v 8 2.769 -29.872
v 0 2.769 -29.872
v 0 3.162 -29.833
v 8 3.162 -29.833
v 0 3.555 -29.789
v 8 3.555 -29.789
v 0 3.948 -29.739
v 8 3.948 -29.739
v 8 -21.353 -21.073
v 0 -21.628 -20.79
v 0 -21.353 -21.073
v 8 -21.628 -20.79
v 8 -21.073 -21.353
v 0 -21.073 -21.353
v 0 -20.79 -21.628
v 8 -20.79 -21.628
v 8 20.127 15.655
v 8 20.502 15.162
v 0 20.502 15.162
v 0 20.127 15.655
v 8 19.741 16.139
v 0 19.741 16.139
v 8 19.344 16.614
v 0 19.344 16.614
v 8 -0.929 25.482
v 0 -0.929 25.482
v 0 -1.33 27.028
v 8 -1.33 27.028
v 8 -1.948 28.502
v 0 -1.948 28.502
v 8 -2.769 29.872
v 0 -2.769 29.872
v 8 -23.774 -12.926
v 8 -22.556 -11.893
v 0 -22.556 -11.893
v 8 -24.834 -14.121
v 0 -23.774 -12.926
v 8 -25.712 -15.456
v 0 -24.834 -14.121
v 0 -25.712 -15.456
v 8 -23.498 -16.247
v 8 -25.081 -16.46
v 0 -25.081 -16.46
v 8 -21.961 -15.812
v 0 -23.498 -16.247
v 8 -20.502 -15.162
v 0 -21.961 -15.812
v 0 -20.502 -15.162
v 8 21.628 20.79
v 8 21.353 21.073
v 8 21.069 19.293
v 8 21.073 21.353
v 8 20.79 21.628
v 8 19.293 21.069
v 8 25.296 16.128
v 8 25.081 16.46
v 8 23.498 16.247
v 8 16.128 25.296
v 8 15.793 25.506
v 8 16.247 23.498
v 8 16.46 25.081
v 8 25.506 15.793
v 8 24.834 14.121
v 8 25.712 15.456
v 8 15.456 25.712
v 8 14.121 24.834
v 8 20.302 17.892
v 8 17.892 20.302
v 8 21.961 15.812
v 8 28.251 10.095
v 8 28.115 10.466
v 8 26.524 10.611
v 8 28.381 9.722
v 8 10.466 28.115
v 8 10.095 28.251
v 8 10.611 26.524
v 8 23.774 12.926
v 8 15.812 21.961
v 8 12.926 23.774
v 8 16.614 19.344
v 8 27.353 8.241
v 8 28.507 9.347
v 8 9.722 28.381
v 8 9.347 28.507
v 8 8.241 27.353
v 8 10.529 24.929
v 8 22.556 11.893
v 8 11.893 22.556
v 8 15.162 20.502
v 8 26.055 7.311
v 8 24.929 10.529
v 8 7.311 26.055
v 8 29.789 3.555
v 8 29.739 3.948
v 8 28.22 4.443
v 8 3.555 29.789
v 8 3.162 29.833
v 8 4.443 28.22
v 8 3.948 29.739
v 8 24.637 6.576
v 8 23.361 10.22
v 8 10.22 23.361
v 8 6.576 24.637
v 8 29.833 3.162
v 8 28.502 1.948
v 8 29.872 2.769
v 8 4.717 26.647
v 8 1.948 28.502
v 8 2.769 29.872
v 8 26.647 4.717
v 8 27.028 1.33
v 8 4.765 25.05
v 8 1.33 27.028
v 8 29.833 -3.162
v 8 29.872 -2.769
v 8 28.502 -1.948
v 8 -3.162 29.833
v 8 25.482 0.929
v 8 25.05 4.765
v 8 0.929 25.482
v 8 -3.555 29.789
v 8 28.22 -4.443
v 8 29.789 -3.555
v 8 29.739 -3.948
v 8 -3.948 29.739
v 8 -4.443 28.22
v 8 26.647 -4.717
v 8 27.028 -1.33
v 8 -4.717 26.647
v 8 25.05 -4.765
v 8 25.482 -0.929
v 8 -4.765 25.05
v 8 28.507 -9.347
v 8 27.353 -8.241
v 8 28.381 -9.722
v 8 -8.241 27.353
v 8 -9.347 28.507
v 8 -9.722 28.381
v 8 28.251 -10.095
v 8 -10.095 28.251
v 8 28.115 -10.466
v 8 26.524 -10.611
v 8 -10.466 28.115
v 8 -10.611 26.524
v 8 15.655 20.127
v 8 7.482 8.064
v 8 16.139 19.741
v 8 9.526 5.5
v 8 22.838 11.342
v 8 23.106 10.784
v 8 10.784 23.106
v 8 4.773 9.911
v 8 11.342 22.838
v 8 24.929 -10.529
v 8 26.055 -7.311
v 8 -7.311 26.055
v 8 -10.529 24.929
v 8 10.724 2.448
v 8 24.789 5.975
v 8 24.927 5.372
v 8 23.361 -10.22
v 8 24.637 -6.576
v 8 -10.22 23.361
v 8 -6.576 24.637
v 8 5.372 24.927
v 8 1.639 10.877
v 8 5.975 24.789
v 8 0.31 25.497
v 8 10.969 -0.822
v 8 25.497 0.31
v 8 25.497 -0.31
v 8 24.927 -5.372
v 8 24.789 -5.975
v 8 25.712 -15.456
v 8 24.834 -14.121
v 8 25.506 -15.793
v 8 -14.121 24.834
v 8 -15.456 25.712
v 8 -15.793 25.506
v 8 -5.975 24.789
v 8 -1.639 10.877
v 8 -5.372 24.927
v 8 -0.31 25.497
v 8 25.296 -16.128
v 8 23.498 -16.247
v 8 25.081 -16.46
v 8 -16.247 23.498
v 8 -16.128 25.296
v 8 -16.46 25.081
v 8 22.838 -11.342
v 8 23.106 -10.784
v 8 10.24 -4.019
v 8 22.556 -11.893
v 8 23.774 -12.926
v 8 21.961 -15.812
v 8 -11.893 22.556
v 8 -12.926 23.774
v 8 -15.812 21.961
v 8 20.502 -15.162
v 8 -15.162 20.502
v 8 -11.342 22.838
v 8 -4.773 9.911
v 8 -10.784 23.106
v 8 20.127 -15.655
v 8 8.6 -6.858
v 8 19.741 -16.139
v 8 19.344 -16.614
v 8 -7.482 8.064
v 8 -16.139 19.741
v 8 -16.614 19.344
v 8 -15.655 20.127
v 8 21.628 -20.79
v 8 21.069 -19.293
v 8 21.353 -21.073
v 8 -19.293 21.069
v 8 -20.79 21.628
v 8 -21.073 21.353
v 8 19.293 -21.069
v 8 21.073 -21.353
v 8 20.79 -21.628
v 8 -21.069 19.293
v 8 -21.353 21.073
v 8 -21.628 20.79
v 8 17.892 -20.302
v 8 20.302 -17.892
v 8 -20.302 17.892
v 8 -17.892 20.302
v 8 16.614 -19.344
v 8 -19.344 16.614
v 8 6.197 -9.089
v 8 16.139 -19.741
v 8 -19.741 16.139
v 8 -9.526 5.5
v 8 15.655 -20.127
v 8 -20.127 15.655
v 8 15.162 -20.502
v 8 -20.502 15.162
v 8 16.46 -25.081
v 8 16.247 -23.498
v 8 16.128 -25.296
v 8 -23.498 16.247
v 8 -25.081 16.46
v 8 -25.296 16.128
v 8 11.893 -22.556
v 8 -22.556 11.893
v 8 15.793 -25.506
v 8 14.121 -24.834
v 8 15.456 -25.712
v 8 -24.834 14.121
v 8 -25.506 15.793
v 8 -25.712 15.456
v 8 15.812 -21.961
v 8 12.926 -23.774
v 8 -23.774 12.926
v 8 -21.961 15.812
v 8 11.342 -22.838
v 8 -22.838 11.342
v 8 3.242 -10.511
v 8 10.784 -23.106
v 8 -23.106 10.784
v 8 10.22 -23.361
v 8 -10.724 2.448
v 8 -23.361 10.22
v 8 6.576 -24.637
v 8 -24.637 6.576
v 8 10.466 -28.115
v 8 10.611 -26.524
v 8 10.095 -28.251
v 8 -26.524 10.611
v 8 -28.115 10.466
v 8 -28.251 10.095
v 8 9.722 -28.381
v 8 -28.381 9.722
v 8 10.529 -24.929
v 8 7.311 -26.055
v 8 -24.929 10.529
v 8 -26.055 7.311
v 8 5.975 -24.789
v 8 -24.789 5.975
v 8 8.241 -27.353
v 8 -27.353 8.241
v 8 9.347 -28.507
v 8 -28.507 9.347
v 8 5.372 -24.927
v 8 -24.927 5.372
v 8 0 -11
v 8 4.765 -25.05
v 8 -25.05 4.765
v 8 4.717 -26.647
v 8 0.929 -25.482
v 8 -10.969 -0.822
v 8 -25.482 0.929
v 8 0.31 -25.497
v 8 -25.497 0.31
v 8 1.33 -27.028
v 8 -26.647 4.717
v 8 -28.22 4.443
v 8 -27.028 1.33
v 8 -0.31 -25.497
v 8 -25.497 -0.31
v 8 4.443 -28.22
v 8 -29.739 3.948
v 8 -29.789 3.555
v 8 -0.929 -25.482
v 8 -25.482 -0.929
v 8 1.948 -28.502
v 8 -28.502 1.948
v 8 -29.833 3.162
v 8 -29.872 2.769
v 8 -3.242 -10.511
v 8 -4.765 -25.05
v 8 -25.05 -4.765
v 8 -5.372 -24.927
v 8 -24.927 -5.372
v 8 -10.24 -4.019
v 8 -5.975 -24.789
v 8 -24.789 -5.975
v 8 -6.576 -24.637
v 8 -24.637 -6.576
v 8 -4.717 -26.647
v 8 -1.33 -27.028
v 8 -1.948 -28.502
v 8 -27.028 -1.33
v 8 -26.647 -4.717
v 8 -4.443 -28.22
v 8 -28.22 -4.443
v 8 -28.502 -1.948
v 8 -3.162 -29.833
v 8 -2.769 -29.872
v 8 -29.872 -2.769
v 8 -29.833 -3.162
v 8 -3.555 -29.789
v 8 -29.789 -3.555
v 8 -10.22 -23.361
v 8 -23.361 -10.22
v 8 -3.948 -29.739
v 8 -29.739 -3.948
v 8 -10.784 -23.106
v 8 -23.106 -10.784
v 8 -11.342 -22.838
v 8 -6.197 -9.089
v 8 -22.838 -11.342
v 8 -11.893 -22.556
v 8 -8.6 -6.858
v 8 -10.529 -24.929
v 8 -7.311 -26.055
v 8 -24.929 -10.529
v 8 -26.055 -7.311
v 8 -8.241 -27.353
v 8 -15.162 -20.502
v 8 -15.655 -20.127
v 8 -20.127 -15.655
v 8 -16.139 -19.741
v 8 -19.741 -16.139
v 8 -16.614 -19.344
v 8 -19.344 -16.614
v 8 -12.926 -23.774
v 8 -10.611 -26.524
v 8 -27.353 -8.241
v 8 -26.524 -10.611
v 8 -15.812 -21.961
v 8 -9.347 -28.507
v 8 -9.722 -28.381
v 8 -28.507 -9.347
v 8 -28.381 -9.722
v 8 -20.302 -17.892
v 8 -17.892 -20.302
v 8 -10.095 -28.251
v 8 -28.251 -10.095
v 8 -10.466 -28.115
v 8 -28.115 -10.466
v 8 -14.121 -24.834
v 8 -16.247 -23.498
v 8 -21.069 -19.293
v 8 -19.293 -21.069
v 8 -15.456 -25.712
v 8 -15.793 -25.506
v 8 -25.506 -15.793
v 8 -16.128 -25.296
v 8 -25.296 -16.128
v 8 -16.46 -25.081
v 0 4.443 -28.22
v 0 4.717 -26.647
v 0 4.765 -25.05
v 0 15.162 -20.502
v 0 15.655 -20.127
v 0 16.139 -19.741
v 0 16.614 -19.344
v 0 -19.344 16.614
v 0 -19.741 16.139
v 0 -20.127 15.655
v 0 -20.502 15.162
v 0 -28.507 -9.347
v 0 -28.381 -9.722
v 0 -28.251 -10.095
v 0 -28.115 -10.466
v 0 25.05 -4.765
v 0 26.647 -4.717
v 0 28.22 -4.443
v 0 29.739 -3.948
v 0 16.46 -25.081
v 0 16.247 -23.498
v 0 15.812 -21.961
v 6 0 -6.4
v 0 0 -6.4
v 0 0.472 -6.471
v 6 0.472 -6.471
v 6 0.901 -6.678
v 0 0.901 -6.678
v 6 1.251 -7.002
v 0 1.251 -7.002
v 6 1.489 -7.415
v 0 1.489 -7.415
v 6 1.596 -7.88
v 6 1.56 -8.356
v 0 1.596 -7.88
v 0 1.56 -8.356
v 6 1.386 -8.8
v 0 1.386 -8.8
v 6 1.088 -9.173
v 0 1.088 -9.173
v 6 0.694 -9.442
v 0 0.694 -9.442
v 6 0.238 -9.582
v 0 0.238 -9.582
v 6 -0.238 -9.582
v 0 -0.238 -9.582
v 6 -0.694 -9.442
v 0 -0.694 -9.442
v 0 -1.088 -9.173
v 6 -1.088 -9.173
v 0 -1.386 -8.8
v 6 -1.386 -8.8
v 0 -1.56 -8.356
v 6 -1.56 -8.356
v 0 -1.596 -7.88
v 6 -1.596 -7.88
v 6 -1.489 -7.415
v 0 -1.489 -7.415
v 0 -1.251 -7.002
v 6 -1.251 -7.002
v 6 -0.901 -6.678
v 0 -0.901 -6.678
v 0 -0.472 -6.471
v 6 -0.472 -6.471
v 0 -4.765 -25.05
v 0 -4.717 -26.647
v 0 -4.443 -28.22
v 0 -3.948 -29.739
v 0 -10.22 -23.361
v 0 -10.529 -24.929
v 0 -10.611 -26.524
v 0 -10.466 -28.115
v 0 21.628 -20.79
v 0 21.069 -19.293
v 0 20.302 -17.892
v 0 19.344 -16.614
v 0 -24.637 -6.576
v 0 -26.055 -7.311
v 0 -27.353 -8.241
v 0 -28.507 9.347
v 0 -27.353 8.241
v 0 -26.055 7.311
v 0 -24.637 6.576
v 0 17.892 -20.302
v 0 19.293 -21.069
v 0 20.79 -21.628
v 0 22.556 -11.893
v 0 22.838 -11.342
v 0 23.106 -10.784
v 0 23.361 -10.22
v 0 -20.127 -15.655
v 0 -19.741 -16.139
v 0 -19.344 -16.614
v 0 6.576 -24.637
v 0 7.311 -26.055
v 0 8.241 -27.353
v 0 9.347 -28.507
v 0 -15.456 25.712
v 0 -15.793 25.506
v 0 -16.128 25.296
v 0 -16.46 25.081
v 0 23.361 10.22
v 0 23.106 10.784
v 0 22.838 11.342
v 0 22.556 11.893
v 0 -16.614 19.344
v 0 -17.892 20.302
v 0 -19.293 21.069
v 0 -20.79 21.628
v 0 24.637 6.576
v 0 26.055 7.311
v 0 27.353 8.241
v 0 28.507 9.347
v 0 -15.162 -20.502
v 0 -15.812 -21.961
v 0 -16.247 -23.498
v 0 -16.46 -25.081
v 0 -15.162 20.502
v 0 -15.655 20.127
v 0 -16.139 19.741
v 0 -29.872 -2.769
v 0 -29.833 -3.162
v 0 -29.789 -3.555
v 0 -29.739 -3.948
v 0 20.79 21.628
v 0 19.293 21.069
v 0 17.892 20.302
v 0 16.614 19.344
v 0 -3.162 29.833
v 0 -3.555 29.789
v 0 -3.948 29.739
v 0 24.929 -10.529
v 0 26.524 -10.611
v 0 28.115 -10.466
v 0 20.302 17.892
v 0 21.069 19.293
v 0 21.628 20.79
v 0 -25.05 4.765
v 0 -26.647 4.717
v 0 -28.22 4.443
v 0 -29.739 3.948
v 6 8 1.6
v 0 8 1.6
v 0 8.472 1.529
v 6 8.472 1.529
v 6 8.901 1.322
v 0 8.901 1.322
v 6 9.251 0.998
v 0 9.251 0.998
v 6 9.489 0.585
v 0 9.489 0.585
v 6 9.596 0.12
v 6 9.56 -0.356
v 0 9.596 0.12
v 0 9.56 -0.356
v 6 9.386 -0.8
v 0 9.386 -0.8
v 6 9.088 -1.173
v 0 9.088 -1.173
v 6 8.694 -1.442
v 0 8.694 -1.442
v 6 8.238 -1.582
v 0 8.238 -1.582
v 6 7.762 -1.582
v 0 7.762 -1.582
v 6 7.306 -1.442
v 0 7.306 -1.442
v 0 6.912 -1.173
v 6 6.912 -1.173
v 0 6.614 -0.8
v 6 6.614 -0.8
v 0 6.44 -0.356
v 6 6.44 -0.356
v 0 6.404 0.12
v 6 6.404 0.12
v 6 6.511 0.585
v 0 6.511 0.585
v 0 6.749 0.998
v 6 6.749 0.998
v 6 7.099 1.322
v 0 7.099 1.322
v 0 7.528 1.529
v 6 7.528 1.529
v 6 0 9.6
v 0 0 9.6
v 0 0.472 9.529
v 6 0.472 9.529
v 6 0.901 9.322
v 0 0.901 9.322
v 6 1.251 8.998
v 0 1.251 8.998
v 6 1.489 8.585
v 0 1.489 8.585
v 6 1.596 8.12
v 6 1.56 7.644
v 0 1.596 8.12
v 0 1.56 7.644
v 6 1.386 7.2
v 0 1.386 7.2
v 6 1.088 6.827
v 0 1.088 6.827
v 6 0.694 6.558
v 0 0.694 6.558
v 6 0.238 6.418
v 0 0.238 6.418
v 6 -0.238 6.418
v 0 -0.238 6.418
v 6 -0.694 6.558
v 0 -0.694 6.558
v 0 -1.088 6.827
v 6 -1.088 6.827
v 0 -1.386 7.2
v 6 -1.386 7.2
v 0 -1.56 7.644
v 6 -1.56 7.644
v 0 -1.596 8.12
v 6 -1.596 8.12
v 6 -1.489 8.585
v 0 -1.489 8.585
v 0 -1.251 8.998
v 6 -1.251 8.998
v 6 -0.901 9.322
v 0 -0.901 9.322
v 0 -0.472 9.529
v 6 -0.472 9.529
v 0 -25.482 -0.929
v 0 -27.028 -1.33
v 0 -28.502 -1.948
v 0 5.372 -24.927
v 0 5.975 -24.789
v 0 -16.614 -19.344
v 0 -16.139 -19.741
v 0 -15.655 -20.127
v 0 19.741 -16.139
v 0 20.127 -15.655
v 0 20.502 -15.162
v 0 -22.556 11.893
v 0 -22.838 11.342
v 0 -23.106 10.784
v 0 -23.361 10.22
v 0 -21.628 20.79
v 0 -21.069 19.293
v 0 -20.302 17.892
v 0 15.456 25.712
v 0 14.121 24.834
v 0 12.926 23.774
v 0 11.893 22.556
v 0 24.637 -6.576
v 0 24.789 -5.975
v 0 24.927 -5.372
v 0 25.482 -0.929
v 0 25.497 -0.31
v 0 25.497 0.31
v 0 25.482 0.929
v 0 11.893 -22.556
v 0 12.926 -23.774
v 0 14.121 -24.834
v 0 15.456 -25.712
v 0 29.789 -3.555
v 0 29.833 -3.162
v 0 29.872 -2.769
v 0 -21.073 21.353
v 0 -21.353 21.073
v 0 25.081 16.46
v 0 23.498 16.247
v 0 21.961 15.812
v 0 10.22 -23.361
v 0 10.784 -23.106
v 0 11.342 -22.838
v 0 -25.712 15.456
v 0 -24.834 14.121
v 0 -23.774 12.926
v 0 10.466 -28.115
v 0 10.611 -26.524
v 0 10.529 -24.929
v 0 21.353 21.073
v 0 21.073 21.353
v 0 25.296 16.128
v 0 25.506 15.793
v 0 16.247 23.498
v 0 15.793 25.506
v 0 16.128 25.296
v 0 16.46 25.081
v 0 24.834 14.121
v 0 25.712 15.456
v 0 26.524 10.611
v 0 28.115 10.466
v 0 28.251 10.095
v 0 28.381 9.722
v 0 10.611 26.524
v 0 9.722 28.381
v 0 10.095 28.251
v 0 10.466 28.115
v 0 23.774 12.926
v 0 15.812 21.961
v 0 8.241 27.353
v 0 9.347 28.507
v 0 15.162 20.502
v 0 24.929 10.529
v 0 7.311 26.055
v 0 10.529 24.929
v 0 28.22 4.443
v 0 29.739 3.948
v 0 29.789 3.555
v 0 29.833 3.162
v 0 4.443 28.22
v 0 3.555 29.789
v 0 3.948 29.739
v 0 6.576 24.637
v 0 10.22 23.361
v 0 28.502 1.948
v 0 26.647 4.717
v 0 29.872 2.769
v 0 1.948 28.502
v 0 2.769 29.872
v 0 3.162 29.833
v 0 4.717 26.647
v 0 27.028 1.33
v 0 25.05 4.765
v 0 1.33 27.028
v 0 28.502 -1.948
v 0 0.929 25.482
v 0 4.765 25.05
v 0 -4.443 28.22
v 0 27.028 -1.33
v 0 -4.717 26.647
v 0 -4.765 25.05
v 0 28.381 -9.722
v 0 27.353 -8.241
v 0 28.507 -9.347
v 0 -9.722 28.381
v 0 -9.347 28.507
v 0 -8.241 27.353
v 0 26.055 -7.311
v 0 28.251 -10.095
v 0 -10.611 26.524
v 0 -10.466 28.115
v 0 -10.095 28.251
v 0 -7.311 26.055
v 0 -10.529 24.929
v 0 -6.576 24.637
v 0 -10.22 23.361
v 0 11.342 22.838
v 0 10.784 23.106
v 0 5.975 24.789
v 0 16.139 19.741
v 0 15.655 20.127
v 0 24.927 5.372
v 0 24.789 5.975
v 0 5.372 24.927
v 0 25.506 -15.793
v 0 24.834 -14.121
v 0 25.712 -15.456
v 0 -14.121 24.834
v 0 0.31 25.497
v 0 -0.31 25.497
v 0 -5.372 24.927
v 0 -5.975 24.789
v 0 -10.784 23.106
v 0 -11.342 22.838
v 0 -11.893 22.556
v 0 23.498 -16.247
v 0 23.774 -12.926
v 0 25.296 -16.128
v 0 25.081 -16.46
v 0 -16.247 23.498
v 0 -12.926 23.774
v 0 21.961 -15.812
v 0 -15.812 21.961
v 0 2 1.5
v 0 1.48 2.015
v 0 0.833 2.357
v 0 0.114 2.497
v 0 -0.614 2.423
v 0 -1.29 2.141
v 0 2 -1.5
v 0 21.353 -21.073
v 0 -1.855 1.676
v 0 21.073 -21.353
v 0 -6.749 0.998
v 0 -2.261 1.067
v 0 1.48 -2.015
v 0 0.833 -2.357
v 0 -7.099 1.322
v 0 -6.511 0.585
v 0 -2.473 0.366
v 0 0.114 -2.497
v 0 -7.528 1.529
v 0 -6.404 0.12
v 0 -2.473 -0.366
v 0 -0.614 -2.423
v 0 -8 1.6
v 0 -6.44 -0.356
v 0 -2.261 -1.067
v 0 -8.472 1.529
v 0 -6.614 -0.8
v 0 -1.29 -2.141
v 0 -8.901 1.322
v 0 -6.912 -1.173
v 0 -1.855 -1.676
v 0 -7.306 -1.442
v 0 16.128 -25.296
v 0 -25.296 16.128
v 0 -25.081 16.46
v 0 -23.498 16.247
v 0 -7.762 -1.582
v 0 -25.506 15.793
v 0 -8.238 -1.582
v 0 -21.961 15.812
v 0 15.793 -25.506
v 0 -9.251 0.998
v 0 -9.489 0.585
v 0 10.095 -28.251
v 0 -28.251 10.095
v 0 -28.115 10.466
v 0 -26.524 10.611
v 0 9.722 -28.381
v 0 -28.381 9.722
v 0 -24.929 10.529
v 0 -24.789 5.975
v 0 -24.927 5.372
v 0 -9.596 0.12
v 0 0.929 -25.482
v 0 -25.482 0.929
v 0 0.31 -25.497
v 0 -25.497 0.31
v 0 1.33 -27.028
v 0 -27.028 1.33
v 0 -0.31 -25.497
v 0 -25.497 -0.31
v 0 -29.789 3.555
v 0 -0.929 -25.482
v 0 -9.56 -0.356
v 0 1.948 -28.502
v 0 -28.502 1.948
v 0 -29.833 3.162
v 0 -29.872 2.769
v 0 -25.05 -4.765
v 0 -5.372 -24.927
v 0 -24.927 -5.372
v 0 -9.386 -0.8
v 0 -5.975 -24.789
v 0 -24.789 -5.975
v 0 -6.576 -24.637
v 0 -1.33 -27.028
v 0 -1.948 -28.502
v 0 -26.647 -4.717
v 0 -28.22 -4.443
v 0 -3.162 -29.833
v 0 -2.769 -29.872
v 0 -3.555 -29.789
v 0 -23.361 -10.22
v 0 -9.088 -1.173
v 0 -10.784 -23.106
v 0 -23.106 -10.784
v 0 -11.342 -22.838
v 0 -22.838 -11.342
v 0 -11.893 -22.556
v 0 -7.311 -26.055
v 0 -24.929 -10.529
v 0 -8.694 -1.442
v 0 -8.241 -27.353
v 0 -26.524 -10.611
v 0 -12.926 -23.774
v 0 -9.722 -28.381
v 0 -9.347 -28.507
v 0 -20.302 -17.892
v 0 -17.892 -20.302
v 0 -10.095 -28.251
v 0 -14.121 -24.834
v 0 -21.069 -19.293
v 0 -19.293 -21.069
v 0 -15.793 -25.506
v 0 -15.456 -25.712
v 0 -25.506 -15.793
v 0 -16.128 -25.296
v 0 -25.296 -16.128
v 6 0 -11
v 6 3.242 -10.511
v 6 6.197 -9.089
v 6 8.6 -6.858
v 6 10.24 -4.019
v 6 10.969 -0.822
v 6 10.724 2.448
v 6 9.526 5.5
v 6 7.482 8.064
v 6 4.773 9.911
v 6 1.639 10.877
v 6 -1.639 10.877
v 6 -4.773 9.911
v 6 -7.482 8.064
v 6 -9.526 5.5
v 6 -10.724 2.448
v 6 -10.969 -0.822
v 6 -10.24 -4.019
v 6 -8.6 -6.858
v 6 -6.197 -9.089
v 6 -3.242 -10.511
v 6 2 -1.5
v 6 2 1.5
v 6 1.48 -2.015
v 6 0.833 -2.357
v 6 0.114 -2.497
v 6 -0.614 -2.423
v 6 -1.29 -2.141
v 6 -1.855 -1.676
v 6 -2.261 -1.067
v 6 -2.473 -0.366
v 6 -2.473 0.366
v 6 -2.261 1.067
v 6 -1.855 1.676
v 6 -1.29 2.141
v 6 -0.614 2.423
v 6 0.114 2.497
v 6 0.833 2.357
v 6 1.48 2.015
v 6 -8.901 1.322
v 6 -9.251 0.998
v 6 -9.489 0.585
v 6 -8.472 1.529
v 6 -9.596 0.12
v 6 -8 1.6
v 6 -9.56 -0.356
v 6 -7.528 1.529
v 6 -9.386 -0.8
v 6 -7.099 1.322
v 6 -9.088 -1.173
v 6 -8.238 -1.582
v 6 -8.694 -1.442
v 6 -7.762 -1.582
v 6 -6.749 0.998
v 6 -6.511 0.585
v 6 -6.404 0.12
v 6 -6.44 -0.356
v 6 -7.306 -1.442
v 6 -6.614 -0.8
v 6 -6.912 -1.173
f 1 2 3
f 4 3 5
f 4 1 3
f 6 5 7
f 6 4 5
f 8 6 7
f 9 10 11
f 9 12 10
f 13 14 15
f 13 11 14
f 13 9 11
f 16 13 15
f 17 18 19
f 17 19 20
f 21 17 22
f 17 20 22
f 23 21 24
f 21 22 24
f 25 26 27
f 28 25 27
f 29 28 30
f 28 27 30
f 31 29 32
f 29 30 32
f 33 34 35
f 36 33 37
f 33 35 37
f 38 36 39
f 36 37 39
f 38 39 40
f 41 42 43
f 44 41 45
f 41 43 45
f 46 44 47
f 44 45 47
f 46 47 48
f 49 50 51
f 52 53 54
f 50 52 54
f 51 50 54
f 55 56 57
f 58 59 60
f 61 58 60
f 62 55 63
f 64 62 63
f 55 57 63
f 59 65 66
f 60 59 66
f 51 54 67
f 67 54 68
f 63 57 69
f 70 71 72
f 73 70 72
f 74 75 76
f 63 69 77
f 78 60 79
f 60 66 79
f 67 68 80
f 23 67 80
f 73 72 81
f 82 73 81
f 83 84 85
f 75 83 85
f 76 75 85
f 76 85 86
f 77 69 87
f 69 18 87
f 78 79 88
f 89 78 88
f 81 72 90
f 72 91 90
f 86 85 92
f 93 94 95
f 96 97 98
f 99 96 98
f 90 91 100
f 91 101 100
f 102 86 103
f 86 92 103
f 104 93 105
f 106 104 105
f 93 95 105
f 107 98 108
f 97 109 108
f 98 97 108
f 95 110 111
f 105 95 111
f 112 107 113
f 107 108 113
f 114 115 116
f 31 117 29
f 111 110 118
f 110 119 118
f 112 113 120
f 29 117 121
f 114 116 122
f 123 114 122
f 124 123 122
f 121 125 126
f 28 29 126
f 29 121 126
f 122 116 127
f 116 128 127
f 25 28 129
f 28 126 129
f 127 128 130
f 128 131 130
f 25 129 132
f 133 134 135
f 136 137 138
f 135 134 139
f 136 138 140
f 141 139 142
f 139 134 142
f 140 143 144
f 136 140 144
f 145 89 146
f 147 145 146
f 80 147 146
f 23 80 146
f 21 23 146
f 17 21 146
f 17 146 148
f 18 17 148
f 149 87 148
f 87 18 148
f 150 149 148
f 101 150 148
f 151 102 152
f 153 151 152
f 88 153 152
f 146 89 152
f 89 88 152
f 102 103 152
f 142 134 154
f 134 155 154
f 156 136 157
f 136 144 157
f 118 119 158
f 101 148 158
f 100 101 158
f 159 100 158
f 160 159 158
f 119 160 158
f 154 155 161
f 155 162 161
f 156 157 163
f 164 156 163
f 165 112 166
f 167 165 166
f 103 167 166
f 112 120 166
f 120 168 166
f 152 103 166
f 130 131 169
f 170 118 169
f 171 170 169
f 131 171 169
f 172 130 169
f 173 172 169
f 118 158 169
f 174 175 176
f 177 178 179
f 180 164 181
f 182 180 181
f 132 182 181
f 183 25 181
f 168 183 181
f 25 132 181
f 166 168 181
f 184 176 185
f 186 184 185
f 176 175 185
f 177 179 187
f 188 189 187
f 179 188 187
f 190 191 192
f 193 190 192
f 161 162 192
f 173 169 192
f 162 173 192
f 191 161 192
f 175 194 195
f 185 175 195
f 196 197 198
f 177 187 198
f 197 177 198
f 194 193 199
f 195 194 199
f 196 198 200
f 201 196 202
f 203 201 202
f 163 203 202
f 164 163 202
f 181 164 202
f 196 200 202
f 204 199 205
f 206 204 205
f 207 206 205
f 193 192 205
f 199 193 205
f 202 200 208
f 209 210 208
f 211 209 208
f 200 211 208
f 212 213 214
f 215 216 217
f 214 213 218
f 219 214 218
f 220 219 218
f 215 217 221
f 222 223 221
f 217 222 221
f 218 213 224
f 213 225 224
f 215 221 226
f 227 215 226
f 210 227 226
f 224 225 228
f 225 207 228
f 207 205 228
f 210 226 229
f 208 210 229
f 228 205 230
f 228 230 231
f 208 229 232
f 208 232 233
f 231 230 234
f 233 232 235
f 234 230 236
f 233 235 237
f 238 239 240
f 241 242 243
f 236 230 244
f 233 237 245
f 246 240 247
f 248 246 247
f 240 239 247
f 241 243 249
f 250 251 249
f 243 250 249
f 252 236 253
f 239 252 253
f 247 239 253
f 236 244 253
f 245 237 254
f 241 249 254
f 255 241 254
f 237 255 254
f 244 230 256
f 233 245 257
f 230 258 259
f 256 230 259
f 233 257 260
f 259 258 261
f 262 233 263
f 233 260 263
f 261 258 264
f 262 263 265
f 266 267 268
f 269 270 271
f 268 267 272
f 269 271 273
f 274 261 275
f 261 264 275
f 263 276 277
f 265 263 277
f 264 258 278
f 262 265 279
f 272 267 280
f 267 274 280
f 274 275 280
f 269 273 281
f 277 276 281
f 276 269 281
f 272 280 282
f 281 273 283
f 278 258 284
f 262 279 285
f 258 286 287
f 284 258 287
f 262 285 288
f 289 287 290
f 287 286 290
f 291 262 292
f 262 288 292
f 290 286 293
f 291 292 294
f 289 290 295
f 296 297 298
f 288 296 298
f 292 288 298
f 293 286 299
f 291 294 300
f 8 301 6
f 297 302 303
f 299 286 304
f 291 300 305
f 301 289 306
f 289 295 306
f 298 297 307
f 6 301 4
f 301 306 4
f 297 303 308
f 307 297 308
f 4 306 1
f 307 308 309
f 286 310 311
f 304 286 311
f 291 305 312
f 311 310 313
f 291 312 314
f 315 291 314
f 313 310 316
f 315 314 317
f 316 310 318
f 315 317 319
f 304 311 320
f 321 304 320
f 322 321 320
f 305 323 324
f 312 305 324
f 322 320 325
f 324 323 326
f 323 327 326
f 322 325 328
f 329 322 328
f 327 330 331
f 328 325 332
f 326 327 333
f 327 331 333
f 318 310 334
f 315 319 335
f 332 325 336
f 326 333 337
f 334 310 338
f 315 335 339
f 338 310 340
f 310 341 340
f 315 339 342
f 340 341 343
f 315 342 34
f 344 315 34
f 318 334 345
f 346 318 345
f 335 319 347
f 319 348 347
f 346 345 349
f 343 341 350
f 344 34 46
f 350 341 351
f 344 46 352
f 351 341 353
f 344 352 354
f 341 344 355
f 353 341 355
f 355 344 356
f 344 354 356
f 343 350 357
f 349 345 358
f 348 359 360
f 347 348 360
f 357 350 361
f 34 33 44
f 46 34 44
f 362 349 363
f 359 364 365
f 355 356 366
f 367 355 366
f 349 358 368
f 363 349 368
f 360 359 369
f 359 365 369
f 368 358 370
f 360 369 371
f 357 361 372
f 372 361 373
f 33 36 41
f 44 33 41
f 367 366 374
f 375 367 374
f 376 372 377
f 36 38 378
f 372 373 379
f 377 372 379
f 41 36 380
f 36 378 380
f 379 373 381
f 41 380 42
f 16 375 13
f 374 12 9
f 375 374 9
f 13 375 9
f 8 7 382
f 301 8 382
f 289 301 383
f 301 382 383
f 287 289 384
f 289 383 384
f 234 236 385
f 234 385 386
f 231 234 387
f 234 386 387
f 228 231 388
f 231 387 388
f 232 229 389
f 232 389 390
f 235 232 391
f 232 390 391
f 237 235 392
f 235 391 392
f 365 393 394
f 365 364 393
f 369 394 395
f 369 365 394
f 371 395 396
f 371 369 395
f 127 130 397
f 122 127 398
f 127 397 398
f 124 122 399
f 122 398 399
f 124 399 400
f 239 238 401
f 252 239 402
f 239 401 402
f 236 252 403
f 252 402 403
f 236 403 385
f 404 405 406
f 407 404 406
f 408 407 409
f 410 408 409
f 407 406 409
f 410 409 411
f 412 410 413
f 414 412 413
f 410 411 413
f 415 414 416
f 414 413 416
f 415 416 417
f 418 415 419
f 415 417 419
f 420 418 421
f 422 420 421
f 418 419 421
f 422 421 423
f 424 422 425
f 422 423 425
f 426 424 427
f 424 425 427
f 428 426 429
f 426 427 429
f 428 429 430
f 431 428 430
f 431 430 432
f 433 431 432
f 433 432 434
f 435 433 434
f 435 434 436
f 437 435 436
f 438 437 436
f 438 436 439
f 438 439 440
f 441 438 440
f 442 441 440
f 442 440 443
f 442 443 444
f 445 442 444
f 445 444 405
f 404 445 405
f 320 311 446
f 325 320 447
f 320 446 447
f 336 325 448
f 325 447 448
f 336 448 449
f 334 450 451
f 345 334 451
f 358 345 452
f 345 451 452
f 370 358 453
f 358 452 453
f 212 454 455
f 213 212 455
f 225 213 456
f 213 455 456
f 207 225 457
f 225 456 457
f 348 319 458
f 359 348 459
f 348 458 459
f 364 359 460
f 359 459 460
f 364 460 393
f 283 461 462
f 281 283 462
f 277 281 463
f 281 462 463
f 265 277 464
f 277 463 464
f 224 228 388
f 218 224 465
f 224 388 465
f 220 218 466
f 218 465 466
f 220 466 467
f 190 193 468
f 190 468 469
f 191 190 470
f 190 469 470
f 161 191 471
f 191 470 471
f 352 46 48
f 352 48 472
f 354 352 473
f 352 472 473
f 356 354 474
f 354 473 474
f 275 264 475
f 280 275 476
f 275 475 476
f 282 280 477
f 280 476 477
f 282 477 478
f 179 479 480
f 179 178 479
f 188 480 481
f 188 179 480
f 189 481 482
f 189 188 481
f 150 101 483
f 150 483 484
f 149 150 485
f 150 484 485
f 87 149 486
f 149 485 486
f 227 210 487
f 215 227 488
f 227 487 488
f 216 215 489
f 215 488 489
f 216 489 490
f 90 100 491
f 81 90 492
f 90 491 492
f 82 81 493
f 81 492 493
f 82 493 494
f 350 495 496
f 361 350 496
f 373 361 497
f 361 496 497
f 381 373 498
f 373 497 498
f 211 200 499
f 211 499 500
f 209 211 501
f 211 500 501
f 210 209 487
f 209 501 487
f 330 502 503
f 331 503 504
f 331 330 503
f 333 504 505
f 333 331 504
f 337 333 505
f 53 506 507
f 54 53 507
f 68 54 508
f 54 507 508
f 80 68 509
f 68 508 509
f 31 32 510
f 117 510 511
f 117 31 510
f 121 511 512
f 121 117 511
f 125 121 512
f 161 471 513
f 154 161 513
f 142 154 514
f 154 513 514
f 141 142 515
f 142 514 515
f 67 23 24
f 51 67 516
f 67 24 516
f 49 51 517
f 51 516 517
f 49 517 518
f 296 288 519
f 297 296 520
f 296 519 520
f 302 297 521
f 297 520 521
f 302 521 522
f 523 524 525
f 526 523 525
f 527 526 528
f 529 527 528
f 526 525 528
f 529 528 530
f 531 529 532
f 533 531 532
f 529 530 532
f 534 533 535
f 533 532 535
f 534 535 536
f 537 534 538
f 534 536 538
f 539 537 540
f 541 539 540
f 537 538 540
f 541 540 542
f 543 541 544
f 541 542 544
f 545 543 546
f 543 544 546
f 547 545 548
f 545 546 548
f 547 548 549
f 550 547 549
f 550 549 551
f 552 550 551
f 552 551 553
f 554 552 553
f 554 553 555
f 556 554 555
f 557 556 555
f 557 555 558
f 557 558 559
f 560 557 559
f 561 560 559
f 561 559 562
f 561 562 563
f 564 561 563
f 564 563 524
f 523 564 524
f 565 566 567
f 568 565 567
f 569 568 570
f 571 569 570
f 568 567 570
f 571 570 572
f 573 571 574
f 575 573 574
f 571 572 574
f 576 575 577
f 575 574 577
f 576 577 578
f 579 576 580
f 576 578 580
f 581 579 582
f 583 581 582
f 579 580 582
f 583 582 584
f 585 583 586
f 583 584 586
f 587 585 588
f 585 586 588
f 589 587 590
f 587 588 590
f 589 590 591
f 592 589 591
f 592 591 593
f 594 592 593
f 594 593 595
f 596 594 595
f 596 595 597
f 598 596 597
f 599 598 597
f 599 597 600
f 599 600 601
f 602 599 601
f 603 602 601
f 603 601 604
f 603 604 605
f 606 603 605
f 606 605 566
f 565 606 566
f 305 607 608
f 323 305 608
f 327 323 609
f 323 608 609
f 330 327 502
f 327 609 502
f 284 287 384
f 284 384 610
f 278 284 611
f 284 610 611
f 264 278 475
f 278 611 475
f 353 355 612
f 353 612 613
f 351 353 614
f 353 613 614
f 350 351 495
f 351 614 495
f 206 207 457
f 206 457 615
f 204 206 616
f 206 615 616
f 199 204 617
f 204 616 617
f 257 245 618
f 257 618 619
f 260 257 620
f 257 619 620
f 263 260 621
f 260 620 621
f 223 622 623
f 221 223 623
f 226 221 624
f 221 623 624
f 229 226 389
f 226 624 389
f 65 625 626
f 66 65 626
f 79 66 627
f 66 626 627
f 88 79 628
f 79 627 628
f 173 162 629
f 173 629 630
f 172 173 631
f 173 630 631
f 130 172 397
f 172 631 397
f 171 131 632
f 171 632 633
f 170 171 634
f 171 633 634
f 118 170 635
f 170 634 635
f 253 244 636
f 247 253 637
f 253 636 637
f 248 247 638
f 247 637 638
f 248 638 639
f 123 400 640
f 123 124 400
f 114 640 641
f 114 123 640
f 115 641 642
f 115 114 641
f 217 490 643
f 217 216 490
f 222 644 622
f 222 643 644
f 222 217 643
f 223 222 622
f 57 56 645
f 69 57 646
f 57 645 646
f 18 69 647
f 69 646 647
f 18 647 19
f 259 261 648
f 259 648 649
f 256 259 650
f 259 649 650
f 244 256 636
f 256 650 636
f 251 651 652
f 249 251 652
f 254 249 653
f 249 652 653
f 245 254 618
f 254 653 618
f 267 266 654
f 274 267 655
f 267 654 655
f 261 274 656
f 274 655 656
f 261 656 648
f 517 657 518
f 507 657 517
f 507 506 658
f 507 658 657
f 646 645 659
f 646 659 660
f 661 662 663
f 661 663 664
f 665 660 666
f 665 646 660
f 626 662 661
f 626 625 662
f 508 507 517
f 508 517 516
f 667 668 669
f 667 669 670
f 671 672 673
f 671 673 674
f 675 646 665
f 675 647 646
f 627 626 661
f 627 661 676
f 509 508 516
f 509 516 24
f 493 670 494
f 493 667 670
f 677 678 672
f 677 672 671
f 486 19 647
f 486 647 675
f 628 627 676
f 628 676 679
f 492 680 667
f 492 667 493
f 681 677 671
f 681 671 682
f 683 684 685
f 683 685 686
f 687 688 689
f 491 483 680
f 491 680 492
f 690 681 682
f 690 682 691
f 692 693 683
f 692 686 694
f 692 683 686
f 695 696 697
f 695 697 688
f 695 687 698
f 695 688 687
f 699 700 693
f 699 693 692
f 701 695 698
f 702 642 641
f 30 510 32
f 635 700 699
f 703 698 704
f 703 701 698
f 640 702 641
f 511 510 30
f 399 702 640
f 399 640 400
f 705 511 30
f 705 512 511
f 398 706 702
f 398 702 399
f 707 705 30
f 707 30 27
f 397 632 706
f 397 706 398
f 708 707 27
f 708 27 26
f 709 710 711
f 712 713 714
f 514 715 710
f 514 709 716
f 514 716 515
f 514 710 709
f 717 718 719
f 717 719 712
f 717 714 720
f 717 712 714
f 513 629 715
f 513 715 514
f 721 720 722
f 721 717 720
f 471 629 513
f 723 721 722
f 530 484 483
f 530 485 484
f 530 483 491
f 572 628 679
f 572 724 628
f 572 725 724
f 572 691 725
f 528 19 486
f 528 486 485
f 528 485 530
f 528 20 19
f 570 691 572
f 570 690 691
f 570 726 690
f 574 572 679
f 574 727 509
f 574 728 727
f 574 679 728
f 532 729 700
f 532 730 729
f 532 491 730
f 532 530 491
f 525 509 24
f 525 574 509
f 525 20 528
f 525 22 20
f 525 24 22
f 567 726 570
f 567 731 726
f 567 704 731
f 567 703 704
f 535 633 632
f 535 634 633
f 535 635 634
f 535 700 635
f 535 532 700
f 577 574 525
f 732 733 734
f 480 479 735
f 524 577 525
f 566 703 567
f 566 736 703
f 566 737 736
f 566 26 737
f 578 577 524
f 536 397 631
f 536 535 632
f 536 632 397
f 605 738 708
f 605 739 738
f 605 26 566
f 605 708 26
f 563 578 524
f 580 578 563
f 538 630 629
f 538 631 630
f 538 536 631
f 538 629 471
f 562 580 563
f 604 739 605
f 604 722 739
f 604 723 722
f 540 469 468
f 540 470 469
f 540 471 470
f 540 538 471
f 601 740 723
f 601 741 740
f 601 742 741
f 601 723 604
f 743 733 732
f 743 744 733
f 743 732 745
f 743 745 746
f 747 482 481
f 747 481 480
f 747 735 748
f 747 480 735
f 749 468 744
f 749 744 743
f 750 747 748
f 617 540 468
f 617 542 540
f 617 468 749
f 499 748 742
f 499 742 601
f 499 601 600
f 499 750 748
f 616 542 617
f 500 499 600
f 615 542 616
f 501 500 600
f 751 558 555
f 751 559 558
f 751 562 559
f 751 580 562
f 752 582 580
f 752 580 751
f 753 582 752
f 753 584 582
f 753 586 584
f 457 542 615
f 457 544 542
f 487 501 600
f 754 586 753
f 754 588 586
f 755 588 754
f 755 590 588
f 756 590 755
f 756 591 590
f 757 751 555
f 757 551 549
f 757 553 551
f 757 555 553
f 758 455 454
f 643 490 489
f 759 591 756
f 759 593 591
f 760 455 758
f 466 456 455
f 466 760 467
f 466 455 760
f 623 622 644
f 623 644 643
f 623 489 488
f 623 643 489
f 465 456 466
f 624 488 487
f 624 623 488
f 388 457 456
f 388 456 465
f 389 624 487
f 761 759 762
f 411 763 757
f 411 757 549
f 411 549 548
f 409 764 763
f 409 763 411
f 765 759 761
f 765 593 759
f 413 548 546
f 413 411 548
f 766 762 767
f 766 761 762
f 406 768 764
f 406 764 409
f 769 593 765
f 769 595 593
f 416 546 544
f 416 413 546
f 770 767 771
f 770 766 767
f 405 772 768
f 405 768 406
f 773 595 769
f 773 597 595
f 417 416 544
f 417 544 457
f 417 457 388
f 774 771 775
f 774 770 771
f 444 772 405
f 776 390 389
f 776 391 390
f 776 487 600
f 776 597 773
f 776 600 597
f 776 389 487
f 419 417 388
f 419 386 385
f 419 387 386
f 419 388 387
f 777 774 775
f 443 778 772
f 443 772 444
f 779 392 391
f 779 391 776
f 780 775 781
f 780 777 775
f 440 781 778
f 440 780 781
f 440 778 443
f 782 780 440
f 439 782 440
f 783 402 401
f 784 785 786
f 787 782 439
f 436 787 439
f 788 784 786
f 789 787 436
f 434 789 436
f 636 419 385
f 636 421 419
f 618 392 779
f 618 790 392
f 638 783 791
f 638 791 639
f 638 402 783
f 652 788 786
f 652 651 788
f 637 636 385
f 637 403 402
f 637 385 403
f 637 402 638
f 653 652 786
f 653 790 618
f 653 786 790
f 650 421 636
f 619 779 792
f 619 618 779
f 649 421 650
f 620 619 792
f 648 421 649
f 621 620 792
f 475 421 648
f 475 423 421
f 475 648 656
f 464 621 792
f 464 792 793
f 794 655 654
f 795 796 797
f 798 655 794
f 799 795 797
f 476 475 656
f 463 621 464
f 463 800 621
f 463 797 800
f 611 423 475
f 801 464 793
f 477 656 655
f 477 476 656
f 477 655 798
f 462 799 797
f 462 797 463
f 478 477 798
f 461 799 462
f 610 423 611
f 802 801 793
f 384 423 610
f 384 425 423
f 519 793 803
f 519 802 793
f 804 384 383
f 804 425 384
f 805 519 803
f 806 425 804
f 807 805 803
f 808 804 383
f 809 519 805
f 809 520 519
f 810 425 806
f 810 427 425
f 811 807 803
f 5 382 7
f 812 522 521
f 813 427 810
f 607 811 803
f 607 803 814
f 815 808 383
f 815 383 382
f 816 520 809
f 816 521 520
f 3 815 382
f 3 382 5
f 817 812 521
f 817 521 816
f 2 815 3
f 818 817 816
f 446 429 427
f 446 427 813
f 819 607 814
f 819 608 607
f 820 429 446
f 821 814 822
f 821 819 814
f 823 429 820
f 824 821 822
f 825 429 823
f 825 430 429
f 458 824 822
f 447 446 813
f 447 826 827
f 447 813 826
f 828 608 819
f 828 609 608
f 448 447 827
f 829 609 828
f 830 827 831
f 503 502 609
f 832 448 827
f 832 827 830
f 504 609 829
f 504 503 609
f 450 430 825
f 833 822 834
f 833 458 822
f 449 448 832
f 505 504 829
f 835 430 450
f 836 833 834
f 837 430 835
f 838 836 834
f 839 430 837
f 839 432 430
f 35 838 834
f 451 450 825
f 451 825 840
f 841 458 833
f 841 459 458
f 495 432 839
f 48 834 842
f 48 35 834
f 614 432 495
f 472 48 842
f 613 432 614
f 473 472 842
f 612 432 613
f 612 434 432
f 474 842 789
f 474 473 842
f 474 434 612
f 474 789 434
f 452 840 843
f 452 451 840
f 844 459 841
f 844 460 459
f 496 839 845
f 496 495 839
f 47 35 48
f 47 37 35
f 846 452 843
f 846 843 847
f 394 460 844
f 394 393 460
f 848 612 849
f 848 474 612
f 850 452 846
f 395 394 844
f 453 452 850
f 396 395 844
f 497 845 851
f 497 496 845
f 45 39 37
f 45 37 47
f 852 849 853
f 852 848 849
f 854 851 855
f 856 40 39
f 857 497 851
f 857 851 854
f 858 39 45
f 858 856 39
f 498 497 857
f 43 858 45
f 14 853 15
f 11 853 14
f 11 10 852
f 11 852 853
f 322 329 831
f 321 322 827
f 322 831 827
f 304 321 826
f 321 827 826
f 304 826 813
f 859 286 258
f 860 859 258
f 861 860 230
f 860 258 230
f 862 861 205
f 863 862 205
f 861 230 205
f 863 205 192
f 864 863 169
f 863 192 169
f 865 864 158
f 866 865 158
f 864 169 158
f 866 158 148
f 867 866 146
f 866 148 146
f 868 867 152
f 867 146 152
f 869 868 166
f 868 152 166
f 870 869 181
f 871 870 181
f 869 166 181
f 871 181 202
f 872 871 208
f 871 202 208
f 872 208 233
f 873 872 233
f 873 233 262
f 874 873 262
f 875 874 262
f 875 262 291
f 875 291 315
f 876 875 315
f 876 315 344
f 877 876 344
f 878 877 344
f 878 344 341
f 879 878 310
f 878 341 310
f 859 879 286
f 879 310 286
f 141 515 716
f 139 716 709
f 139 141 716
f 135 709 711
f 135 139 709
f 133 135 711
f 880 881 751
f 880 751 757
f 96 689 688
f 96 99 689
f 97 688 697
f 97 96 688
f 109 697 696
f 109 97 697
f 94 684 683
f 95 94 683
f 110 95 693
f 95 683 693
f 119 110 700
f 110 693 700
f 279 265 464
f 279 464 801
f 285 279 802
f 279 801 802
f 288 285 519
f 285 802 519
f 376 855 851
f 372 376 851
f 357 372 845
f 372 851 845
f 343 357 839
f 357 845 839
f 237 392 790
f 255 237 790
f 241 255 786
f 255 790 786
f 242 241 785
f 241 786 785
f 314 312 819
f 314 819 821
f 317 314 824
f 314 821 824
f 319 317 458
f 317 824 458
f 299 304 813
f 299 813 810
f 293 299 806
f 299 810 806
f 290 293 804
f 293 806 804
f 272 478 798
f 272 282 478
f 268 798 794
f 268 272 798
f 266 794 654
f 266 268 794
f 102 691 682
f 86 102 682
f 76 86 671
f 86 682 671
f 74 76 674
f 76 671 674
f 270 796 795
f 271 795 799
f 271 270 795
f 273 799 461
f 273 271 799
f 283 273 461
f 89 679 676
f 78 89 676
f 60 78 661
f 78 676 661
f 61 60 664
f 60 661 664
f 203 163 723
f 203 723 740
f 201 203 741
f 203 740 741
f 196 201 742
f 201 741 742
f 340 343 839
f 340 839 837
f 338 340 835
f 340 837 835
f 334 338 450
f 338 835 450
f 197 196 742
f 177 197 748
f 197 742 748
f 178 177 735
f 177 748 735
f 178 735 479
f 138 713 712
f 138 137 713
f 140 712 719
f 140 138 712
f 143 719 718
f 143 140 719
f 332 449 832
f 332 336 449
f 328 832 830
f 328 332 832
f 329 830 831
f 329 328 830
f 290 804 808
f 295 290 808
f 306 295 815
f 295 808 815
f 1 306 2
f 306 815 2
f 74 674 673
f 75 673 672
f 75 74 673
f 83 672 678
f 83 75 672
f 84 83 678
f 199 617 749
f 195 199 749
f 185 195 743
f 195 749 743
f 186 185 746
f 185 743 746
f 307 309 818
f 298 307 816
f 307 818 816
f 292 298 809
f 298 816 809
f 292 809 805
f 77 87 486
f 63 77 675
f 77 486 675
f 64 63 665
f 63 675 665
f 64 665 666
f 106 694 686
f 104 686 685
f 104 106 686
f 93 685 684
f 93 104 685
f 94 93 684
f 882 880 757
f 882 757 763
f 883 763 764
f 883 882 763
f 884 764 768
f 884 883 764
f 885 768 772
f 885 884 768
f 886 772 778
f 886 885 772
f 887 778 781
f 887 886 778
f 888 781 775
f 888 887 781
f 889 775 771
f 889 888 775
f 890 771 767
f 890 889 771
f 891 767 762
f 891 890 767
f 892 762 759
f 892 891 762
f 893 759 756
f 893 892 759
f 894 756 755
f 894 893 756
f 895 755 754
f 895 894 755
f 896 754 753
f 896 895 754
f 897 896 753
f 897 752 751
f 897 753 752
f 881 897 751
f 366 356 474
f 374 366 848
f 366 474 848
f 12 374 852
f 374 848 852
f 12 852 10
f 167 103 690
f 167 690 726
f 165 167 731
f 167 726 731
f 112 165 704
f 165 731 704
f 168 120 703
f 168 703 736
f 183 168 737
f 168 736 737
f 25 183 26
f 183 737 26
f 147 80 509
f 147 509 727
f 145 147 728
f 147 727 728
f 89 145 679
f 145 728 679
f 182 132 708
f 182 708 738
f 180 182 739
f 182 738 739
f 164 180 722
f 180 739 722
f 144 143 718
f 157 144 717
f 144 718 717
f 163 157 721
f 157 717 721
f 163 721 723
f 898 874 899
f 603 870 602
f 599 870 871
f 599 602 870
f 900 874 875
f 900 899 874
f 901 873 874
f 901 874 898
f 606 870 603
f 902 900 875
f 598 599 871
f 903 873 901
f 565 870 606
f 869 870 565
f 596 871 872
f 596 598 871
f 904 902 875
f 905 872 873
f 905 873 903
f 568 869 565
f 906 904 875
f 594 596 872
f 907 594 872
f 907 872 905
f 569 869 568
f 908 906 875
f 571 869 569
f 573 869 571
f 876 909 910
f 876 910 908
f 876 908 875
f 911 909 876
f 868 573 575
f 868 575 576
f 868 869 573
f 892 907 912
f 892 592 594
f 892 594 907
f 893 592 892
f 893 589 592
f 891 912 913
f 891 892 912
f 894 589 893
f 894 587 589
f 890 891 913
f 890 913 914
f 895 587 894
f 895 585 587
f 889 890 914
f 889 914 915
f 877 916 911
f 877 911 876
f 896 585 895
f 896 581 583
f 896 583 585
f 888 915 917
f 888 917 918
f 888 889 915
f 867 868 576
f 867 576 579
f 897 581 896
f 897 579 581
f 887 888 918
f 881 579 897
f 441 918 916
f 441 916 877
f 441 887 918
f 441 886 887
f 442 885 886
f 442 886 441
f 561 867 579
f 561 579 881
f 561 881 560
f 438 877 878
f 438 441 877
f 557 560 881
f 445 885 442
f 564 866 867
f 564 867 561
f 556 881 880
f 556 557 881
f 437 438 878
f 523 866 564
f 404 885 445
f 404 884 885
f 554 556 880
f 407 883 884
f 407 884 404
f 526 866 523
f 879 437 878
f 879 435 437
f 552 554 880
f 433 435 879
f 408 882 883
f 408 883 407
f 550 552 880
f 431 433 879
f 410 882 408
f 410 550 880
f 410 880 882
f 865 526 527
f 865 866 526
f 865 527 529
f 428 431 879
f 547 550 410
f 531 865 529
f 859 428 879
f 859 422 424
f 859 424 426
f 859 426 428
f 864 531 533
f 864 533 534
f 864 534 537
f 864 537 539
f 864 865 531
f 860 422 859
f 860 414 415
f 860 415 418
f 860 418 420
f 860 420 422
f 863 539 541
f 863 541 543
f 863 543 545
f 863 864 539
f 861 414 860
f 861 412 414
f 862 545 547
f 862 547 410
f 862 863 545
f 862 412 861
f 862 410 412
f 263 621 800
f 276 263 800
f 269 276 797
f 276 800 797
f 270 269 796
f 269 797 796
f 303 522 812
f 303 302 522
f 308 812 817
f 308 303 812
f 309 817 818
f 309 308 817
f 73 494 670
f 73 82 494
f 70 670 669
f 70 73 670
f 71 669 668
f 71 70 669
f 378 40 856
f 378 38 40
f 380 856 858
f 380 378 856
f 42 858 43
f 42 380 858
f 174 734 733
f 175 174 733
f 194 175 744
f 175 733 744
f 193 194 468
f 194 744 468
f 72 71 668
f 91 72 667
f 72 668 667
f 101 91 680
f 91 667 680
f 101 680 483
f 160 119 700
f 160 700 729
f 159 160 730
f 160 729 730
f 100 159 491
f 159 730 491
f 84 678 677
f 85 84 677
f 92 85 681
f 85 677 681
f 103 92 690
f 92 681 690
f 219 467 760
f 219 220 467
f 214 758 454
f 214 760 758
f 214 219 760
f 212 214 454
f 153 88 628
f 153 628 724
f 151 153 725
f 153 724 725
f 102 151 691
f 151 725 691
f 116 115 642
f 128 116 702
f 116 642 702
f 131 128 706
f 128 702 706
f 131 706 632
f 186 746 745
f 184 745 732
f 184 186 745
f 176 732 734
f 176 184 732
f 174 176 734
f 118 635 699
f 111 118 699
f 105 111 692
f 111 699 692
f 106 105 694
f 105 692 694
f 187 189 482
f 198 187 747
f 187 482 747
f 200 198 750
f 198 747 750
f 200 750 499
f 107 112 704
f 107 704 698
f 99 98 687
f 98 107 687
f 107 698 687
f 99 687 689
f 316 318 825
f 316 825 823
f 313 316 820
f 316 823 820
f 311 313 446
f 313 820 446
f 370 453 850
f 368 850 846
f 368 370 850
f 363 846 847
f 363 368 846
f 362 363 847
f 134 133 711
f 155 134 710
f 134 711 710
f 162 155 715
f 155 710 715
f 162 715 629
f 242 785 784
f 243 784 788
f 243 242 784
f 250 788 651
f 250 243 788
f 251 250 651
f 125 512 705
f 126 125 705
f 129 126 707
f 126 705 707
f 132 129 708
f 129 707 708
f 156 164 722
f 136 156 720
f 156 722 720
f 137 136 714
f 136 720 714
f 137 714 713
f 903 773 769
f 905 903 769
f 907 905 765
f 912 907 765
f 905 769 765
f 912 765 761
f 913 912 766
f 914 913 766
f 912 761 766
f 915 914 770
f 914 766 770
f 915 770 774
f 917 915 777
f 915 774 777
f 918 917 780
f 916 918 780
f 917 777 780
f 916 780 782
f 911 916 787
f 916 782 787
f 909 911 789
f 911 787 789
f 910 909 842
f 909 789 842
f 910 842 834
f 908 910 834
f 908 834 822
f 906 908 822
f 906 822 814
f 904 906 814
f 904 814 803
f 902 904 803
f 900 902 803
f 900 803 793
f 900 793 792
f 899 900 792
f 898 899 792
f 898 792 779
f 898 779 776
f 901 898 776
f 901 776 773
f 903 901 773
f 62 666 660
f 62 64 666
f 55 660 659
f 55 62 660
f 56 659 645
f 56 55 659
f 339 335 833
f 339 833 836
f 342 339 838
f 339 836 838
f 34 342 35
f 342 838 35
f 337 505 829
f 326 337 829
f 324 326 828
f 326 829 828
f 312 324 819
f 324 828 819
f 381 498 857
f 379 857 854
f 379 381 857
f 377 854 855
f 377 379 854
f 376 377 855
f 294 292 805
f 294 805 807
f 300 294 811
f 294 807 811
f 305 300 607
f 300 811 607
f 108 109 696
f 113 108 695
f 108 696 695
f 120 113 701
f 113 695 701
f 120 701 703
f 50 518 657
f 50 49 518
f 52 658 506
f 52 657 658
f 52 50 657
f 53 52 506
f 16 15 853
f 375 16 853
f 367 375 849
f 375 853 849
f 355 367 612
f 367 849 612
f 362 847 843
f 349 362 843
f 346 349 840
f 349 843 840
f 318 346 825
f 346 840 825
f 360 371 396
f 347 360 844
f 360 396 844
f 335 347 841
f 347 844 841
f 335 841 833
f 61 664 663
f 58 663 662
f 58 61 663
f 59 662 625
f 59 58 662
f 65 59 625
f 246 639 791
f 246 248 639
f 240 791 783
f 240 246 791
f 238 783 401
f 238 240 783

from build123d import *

# Parameters (mm, degrees)
BASPROSKE_W              = 8
BASPROSKE_H              = 30
TOOTHCUT_DEPTH           = 44.17406629
TEETHCUTS_COUNT          = 28
TEETHCUTS_ANGLE          = 347.142857143
BORSKE_R                 = 0.1
BORE_DEPTH               = 50.0000508
TAGLIO_ESTRUSIONE1_DEPTH = 30
SCHIZZO2_R               = 1.6
TAGLIO_ESTRUSIONE2_DEPTH = 10
SCHIZZO3_R               = 11
TAGLIO_ESTRUSIONE3_DEPTH = 2


with BuildPart() as part:
    # BasProSke → Base-Revolve (revolve)
    with BuildSketch(Plane(origin=(0, 0, 0), x_dir=(1, 0, 0), z_dir=(0, 1, 0)), mode=Mode.PRIVATE) as base_revolve_sk:
        with Locations((4, 15)):
            Rectangle(BASPROSKE_W, BASPROSKE_H)
    revolve(base_revolve_sk.sketch.rotate(Axis((-10, 0, 0), (1, 0, 0)), 180), axis=Axis((-10, 0, 0), (1, 0, 0)))

    # TooCutSke → ToothCut (cut, through all)
    with BuildSketch(Plane(origin=(0, 0, 0), x_dir=(0, 0, -1), z_dir=(1, 0, 0))):
        with BuildLine():
            ThreePointArc((0.928503763, 25.482089431), (0, 25.499), (-0.928503763, 25.482089431))
            ThreePointArc((-0.928503763, 25.482089431), (-1.618524429, 27.789411612), (-2.78585155, 29.895880591))
            ThreePointArc((-2.78585155, 29.895880591), (0, 30.0254), (2.78585155, 29.895880591))
            ThreePointArc((2.78585155, 29.895880591), (1.618524429, 27.789411612), (0.928503763, 25.482089431))
        make_face()
    toothcut = extrude(amount=TOOTHCUT_DEPTH, mode=Mode.SUBTRACT)

    # TeethCuts: ToothCut ×28 about axis
    teethcuts_axis = Axis((-10, 0, 0), (1, 0, 0))
    for i in range(1, TEETHCUTS_COUNT):
        add(toothcut.rotate(teethcuts_axis, i * TEETHCUTS_ANGLE / (TEETHCUTS_COUNT - 1)), mode=Mode.SUBTRACT)

    # BorSke → Bore (cut, symmetric)
    with BuildSketch(Plane(origin=(0, 0, 0), x_dir=(0, 0, -1), z_dir=(1, 0, 0))):
        with Locations(Location((0, 0, 0), (0, 0, 180))):
            Circle(BORSKE_R)
    extrude(amount=BORE_DEPTH, both=True, mode=Mode.SUBTRACT)

    # Schizzo1 → Taglio-Estrusione1 (cut)
    with BuildSketch(Plane(origin=(8, 0, 0), x_dir=(0, 0, -1), z_dir=(1, 0, 0))):
        with BuildLine():
            Line((-1.5, 2), (1.5, 2))
            ThreePointArc((1.5, 2), (0, -2.5), (-1.5, 2))
        make_face()
    extrude(amount=-TAGLIO_ESTRUSIONE1_DEPTH, mode=Mode.SUBTRACT)

    # Schizzo2 → Taglio-Estrusione2 (cut)
    with BuildSketch(Plane.ZY):
        with Locations((0, 8)):
            Circle(SCHIZZO2_R)
        with Locations((8, 0)):
            Circle(SCHIZZO2_R)
        with Locations((0, -8)):
            Circle(SCHIZZO2_R)
        with Locations((-8, 0)):
            Circle(SCHIZZO2_R)
    extrude(amount=-TAGLIO_ESTRUSIONE2_DEPTH, mode=Mode.SUBTRACT)

    # Schizzo3 → Taglio-Estrusione3 (cut)
    with BuildSketch(Plane(origin=(8, 0, 0), x_dir=(0, 0, -1), z_dir=(1, 0, 0))):
        Circle(SCHIZZO3_R)
    extrude(amount=-TAGLIO_ESTRUSIONE3_DEPTH, mode=Mode.SUBTRACT)


solid = part.part
